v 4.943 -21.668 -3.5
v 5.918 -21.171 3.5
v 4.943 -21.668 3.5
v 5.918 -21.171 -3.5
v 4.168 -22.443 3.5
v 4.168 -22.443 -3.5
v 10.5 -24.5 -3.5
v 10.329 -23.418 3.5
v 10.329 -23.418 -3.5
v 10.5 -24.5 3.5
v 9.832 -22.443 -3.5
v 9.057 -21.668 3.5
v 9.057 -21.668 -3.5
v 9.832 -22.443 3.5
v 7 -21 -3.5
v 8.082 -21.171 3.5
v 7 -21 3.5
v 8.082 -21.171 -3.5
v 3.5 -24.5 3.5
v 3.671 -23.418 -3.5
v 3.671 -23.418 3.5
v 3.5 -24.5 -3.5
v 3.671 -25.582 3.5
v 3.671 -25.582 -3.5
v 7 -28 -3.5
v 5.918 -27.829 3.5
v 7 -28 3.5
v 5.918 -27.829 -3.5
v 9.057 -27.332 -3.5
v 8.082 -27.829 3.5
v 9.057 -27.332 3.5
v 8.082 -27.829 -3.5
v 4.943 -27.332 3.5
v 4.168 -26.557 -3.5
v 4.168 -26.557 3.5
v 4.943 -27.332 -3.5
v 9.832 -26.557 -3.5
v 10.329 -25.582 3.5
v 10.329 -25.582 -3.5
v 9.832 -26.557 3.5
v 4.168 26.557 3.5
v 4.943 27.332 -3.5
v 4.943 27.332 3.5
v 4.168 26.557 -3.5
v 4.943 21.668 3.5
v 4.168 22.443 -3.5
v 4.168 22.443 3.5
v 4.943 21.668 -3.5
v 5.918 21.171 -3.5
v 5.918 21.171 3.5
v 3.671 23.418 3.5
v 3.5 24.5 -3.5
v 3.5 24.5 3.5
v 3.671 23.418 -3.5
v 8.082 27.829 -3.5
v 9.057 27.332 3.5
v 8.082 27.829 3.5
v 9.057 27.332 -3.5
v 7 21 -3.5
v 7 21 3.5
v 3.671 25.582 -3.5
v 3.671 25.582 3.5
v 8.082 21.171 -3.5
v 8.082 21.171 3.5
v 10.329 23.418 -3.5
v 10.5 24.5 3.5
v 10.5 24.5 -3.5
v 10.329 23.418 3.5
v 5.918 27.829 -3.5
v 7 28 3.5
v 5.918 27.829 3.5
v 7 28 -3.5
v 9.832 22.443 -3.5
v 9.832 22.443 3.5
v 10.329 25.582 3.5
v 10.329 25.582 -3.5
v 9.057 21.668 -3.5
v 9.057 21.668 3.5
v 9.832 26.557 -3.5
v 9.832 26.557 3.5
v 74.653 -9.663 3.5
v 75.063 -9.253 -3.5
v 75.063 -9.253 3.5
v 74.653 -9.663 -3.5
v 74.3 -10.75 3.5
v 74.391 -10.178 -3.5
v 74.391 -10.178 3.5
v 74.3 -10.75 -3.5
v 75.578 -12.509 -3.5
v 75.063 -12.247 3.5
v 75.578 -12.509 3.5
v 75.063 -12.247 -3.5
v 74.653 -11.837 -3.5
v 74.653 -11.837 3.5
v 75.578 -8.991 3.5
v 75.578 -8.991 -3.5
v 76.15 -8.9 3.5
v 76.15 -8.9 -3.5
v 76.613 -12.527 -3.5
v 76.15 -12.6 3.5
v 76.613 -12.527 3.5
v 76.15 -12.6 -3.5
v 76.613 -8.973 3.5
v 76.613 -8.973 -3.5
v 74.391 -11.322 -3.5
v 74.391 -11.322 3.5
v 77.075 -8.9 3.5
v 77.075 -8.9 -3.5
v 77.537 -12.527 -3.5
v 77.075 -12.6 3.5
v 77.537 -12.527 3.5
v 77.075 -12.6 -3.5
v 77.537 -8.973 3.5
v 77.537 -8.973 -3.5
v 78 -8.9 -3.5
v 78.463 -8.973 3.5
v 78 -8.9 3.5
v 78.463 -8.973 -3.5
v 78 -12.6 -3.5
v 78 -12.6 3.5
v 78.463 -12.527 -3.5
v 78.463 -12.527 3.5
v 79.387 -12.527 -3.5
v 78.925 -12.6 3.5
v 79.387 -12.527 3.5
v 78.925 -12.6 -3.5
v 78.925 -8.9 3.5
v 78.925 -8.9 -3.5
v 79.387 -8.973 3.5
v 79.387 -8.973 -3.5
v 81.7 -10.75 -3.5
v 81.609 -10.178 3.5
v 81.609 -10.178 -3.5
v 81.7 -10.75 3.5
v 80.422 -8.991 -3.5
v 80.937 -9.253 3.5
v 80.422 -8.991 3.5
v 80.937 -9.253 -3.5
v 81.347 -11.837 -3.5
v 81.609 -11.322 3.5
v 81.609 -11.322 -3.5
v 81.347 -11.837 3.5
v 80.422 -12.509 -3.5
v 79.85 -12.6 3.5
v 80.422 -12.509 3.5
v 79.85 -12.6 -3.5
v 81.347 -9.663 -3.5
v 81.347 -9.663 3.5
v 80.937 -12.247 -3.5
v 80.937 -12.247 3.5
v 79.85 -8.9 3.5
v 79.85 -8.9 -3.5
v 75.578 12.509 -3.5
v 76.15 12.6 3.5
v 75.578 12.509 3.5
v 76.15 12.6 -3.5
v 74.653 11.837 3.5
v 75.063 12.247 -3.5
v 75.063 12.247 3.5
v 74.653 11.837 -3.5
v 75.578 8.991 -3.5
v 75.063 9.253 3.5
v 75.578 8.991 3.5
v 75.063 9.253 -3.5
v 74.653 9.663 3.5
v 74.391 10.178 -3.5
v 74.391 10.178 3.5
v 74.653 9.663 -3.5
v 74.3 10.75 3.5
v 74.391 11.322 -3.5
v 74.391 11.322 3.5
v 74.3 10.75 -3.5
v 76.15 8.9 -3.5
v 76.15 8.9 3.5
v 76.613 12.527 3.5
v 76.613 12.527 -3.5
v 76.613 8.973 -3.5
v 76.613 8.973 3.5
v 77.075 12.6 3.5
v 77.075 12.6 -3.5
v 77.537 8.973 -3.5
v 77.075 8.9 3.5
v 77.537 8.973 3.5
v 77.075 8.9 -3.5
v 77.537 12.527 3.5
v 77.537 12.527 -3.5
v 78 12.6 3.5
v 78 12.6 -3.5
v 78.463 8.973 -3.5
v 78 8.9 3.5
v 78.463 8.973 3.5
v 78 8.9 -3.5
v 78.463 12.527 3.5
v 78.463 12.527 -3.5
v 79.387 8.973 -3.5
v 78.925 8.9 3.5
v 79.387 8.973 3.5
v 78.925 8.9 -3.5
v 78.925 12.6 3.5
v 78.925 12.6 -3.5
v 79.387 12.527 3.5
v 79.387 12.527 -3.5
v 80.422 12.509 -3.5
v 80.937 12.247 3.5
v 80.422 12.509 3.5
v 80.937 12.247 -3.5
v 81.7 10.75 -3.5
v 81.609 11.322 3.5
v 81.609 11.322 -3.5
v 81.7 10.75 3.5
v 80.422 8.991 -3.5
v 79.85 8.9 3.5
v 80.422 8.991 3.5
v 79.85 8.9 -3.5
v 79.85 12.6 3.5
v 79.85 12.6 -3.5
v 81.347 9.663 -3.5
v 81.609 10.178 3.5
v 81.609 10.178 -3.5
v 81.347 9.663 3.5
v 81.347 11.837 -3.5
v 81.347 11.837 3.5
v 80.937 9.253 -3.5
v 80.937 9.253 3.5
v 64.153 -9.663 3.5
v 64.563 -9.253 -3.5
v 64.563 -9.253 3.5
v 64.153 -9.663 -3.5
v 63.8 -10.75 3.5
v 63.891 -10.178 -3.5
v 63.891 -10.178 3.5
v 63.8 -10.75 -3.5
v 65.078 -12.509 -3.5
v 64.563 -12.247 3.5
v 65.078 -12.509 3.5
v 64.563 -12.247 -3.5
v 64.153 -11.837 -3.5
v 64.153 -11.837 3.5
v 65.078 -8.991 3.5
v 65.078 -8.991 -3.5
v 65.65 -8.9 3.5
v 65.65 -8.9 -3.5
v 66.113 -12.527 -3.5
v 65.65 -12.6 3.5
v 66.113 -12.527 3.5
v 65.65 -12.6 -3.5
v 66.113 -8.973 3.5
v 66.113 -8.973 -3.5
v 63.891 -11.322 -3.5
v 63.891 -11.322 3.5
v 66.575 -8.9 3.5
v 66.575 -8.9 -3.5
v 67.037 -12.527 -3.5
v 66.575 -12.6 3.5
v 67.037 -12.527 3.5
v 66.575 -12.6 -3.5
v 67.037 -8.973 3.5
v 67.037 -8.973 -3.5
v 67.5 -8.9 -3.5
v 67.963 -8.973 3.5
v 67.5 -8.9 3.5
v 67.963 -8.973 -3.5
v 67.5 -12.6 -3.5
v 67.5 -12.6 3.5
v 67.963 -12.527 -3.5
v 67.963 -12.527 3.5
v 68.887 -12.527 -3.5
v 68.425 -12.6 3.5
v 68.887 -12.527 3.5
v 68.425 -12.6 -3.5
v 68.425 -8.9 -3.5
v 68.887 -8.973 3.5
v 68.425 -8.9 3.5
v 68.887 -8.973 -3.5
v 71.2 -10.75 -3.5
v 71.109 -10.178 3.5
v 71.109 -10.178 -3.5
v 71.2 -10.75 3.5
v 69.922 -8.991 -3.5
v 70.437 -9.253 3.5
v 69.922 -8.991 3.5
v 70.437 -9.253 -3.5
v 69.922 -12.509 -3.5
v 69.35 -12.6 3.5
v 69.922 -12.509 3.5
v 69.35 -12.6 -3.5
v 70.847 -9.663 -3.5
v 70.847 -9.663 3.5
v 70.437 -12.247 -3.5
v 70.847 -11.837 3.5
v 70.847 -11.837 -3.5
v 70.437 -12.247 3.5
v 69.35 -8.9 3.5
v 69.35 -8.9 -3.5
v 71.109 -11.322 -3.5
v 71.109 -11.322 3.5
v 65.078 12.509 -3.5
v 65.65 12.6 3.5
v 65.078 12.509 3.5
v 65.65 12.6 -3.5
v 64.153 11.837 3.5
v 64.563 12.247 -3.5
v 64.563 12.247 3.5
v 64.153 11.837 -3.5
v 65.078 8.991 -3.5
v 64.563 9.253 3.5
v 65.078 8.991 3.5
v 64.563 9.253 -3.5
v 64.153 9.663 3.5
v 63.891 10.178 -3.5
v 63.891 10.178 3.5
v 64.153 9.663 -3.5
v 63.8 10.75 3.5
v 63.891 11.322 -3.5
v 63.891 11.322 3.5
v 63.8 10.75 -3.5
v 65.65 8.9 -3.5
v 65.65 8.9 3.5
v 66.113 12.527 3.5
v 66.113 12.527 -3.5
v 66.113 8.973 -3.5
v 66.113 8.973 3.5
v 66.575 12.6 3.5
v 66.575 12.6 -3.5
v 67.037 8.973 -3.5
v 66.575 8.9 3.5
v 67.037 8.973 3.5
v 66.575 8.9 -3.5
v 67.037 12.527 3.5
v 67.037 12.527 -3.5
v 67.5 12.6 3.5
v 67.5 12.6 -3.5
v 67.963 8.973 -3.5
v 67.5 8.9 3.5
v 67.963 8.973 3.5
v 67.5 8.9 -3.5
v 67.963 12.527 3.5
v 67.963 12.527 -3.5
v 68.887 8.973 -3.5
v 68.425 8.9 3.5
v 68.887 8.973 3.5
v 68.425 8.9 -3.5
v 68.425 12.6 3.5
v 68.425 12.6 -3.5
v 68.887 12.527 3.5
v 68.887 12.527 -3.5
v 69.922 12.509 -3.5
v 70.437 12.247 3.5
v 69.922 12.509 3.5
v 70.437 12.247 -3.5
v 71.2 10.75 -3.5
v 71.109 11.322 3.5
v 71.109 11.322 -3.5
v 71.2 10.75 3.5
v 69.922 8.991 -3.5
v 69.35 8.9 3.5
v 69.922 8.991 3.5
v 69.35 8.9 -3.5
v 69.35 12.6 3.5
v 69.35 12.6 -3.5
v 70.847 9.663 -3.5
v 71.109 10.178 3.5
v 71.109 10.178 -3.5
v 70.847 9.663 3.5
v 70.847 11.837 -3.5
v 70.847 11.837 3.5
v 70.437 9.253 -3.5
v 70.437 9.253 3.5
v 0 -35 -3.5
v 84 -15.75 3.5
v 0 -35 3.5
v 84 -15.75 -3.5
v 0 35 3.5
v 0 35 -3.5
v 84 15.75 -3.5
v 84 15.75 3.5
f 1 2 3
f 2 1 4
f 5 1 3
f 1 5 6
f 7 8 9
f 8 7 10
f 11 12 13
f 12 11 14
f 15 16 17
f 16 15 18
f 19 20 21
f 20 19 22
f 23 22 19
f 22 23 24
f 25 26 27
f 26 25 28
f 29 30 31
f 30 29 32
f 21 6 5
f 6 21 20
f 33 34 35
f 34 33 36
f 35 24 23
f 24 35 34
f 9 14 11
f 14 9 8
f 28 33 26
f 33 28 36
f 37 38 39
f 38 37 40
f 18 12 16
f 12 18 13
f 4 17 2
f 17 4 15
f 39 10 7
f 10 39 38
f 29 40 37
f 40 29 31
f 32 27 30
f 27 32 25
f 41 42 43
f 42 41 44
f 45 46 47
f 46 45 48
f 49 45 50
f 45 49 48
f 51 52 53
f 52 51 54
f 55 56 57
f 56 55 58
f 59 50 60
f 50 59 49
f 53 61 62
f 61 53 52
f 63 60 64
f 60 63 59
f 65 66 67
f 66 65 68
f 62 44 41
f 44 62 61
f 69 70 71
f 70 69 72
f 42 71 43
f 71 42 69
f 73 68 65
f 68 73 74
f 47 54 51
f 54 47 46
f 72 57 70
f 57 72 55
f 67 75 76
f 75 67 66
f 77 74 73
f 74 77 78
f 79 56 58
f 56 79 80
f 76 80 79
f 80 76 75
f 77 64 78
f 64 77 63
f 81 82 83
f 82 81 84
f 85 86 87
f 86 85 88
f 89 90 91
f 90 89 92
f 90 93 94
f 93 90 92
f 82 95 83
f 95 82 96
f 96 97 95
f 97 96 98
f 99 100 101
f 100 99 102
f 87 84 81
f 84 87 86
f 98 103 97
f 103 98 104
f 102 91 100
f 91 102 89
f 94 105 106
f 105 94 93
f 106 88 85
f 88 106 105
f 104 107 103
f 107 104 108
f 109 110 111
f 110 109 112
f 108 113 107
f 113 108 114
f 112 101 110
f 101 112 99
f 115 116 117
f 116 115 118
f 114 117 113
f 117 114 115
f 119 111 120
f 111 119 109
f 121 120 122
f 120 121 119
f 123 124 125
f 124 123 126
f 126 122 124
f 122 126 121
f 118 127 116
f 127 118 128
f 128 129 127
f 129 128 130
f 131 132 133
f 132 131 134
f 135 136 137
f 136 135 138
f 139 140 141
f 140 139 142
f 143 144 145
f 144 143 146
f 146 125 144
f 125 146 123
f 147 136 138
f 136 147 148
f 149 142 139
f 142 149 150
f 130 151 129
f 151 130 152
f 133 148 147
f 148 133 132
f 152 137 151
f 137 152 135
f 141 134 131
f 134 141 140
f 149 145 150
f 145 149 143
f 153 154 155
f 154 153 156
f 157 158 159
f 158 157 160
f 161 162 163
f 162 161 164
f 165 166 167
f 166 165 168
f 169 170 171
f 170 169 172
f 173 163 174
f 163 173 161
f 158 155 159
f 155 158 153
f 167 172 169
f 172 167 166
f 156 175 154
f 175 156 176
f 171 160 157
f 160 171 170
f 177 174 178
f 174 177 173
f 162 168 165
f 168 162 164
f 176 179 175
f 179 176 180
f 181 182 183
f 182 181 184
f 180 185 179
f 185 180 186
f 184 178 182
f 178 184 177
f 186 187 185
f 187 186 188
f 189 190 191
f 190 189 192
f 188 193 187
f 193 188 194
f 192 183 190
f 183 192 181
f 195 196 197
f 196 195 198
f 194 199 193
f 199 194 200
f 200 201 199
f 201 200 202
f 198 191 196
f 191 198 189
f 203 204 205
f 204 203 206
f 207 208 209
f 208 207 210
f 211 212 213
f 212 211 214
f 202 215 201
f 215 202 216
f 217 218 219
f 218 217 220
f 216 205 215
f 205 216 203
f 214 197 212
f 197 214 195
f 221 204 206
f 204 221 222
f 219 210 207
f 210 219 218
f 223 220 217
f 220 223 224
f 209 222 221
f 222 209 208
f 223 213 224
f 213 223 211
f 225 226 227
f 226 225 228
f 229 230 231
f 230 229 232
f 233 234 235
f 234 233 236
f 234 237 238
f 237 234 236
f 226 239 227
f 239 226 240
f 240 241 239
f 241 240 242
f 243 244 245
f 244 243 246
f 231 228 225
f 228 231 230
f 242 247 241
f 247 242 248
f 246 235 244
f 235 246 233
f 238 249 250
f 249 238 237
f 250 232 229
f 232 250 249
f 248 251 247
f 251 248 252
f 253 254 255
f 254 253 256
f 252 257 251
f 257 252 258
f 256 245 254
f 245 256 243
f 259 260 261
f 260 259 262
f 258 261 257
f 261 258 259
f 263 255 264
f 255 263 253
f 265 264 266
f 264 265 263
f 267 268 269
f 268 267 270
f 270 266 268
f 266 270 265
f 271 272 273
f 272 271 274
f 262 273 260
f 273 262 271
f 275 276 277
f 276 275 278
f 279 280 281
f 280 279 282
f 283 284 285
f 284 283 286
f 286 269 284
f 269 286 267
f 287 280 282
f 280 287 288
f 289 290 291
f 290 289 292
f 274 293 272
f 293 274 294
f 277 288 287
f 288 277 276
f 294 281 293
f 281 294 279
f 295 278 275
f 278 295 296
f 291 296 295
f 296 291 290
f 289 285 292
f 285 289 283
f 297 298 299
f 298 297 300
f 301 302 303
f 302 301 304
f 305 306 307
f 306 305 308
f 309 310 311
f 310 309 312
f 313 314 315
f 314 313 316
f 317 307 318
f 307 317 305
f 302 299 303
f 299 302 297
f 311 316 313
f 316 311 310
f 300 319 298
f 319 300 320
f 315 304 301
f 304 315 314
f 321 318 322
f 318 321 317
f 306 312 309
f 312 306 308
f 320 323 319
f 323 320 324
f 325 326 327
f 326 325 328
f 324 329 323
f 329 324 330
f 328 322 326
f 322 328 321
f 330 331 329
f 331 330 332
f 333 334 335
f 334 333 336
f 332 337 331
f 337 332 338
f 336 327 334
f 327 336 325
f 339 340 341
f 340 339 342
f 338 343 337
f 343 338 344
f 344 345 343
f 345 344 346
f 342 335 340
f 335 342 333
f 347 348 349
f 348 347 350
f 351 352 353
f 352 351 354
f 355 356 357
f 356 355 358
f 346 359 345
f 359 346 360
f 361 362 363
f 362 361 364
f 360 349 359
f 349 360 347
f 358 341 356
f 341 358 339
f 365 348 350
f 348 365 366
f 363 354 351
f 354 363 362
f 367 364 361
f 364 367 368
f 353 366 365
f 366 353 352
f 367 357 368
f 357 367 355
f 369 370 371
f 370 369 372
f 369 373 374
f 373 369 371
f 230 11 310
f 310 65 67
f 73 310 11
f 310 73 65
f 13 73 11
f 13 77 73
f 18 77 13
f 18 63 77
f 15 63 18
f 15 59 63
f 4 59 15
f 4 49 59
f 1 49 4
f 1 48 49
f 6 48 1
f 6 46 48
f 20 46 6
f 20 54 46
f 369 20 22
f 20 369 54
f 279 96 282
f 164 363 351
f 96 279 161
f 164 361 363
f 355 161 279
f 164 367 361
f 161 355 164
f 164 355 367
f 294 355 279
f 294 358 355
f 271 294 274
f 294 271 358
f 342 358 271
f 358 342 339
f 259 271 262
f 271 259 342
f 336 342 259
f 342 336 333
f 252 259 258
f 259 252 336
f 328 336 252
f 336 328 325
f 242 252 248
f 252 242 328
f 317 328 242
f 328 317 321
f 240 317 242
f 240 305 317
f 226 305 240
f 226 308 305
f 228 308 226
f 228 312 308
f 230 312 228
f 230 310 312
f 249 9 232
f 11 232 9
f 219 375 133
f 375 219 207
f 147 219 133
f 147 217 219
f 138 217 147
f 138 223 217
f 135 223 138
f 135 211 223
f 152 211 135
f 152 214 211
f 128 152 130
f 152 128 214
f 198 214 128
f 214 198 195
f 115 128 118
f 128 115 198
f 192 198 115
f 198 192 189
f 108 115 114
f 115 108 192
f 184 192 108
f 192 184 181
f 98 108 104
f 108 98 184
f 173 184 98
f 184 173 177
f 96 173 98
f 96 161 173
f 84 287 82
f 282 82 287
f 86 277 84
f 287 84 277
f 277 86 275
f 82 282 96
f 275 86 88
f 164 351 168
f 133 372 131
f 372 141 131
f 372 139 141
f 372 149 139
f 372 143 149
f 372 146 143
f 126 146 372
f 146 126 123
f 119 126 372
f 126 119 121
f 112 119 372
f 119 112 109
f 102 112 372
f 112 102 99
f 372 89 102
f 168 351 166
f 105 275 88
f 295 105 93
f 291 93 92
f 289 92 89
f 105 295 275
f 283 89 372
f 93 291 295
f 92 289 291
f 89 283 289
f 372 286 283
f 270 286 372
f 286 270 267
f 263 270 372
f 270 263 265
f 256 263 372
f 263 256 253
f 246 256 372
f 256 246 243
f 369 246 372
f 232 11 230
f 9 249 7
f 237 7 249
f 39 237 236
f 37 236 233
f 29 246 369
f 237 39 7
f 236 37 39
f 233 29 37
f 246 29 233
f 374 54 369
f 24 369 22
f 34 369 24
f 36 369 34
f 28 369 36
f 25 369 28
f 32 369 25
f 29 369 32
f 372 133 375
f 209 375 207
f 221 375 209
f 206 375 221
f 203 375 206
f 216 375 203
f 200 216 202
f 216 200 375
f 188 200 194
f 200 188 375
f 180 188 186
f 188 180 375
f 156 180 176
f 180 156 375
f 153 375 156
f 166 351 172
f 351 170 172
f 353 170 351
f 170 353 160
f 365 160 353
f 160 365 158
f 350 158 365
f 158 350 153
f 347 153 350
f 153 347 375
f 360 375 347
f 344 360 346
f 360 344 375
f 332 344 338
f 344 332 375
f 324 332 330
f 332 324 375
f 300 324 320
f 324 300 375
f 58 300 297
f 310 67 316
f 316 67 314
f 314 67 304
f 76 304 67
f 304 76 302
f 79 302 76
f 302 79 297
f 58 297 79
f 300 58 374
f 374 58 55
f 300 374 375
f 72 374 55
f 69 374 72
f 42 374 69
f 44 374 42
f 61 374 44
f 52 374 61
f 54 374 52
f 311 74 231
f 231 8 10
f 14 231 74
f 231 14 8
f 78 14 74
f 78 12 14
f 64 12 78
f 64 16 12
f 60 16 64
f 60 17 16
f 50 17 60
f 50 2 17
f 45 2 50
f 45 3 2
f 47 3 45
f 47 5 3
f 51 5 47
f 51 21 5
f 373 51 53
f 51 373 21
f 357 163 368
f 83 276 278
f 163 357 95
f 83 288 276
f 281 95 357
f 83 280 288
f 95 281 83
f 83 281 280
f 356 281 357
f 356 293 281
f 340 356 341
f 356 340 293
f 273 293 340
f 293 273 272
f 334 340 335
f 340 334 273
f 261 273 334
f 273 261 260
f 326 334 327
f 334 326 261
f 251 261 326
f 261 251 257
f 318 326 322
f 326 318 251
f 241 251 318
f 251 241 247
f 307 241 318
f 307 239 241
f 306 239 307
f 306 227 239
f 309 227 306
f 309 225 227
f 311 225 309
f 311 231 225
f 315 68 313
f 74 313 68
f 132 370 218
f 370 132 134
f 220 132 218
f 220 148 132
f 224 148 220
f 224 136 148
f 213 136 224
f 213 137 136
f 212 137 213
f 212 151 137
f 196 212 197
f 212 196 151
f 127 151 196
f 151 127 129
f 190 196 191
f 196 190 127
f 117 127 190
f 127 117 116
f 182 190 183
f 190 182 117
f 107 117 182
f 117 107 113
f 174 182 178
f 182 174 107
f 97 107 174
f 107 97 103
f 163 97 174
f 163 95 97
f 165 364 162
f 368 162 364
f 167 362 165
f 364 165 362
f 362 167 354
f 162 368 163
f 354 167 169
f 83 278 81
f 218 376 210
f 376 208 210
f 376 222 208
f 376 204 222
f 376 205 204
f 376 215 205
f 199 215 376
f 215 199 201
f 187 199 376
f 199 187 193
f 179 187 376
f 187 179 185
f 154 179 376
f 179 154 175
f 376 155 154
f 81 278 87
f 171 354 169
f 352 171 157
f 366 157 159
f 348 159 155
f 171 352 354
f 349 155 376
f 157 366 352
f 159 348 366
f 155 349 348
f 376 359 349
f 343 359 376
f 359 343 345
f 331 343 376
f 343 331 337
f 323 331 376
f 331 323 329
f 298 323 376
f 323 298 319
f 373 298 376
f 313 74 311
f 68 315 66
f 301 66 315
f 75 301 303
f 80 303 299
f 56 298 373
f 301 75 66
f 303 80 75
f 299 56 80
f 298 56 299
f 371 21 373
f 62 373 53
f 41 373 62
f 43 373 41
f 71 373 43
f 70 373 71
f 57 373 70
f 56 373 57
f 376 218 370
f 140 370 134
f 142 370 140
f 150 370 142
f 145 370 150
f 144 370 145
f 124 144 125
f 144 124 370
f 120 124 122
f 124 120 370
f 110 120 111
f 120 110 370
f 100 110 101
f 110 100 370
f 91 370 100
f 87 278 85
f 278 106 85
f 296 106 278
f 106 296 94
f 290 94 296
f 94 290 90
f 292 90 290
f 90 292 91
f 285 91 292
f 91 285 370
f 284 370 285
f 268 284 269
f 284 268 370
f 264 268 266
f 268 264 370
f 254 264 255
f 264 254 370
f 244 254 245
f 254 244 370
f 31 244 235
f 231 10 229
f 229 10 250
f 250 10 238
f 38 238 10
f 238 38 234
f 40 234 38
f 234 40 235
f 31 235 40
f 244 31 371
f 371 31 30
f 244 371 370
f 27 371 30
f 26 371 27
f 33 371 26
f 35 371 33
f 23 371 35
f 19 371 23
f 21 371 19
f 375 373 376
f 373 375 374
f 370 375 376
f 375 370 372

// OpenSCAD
 
//  Created by Jeshua Lacock on 11/16/2012.
//  Copyright 2012 3DTOPO INC. All rights reserved.
//  http://3DTOPO.com

switchHolesAboveSlotHoles = 71.0;	// The height of the top switch holes above the T Slot holes on center 
									// this determines the height of the switch above the T Slot
thickness = 7.0;  //Plate thickness
baseWidth = 70.0; //This is what attaches to the T slot.

switchHolesWidth = 21.5; //The width of the switch holes on center
switchHolesHeight = 10.5; //The height of the switch holes on center

tSlotHoleDiameter = 7.0/2;
switchHoleDiameter = 3.7/2;

// You shouldn't need to adjust these
tSlotHoleHeight = (tSlotHoleDiameter * 2);
height = switchHolesAboveSlotHoles - 1 + (tSlotHoleHeight * 2);
topWidth = switchHolesWidth + 10.0;  //needs to be wide enough for the switch holes
holeResolution = 20; //The higher the number, the smoother the holes, but the longer it takes to render

color("SeaGreen")

rotate([0,90,0]) {

difference() {

  ////////////////////////////////// Main Mount ////////////////////////////////// 
  polyhedron(
    points=[ [(thickness/2),(baseWidth/2),0],[(thickness/2),-(baseWidth/2),0],[-(thickness/2),-(baseWidth/2),0],[-(thickness/2),(baseWidth/2),0], // the four points at base
           [(thickness/2),(topWidth/2),height], [-(thickness/2),(topWidth/2),height], [(thickness/2),-(topWidth/2),height], [-(thickness/2),-(topWidth/2),height]  ],                                 
    triangles=[ 	[0,1,4],[1,2,6],[2,3,5],[3,0,4],
 				[3,4,5],[6,2,7], [4,1,6], [2,5,7],
				[5,6,7], [5,4,6], // two triangles for top base
              	[1,0,3], [2,1,3] ] // two triangles for bottom base
   );

  ///////////////////////////////// T Slot Holes /////////////////////////////////
  union() {
     for (y = [-1, 1]) {
        translate([0, (baseWidth/2 - (tSlotHoleHeight * 1.5)) * y, tSlotHoleHeight]) {
           rotate([0,90,0]) {
              cylinder (h = thickness + 1, r=tSlotHoleDiameter, center = true, $fn=holeResolution);
           }
        }
     }
  }

  ////////////////////////////// Switch Hole Slots //////////////////////////////
  // Note: even though my switches only have 2 holes, the 4 holes 
  // allow for it to be mounted facing either direction
  union() {

     for (z = [0, switchHolesHeight]) { //loop for top and bottom holes
        for (y = [-1, 1]) { //loop for left and right holes
           for (slot = [-1, -0.5, 0, 0.5, 1]) { //loop to make the slots
              translate([0, y * (switchHolesWidth/2), (tSlotHoleHeight + switchHolesAboveSlotHoles) + (slot * switchHoleDiameter) - z]) {
                 rotate([0,90,0]) {
                    cylinder (h = thickness + 1, r=switchHoleDiameter, center = true, $fn=holeResolution);
                 }  
              }
           }
        }
     }
  }
}
}
